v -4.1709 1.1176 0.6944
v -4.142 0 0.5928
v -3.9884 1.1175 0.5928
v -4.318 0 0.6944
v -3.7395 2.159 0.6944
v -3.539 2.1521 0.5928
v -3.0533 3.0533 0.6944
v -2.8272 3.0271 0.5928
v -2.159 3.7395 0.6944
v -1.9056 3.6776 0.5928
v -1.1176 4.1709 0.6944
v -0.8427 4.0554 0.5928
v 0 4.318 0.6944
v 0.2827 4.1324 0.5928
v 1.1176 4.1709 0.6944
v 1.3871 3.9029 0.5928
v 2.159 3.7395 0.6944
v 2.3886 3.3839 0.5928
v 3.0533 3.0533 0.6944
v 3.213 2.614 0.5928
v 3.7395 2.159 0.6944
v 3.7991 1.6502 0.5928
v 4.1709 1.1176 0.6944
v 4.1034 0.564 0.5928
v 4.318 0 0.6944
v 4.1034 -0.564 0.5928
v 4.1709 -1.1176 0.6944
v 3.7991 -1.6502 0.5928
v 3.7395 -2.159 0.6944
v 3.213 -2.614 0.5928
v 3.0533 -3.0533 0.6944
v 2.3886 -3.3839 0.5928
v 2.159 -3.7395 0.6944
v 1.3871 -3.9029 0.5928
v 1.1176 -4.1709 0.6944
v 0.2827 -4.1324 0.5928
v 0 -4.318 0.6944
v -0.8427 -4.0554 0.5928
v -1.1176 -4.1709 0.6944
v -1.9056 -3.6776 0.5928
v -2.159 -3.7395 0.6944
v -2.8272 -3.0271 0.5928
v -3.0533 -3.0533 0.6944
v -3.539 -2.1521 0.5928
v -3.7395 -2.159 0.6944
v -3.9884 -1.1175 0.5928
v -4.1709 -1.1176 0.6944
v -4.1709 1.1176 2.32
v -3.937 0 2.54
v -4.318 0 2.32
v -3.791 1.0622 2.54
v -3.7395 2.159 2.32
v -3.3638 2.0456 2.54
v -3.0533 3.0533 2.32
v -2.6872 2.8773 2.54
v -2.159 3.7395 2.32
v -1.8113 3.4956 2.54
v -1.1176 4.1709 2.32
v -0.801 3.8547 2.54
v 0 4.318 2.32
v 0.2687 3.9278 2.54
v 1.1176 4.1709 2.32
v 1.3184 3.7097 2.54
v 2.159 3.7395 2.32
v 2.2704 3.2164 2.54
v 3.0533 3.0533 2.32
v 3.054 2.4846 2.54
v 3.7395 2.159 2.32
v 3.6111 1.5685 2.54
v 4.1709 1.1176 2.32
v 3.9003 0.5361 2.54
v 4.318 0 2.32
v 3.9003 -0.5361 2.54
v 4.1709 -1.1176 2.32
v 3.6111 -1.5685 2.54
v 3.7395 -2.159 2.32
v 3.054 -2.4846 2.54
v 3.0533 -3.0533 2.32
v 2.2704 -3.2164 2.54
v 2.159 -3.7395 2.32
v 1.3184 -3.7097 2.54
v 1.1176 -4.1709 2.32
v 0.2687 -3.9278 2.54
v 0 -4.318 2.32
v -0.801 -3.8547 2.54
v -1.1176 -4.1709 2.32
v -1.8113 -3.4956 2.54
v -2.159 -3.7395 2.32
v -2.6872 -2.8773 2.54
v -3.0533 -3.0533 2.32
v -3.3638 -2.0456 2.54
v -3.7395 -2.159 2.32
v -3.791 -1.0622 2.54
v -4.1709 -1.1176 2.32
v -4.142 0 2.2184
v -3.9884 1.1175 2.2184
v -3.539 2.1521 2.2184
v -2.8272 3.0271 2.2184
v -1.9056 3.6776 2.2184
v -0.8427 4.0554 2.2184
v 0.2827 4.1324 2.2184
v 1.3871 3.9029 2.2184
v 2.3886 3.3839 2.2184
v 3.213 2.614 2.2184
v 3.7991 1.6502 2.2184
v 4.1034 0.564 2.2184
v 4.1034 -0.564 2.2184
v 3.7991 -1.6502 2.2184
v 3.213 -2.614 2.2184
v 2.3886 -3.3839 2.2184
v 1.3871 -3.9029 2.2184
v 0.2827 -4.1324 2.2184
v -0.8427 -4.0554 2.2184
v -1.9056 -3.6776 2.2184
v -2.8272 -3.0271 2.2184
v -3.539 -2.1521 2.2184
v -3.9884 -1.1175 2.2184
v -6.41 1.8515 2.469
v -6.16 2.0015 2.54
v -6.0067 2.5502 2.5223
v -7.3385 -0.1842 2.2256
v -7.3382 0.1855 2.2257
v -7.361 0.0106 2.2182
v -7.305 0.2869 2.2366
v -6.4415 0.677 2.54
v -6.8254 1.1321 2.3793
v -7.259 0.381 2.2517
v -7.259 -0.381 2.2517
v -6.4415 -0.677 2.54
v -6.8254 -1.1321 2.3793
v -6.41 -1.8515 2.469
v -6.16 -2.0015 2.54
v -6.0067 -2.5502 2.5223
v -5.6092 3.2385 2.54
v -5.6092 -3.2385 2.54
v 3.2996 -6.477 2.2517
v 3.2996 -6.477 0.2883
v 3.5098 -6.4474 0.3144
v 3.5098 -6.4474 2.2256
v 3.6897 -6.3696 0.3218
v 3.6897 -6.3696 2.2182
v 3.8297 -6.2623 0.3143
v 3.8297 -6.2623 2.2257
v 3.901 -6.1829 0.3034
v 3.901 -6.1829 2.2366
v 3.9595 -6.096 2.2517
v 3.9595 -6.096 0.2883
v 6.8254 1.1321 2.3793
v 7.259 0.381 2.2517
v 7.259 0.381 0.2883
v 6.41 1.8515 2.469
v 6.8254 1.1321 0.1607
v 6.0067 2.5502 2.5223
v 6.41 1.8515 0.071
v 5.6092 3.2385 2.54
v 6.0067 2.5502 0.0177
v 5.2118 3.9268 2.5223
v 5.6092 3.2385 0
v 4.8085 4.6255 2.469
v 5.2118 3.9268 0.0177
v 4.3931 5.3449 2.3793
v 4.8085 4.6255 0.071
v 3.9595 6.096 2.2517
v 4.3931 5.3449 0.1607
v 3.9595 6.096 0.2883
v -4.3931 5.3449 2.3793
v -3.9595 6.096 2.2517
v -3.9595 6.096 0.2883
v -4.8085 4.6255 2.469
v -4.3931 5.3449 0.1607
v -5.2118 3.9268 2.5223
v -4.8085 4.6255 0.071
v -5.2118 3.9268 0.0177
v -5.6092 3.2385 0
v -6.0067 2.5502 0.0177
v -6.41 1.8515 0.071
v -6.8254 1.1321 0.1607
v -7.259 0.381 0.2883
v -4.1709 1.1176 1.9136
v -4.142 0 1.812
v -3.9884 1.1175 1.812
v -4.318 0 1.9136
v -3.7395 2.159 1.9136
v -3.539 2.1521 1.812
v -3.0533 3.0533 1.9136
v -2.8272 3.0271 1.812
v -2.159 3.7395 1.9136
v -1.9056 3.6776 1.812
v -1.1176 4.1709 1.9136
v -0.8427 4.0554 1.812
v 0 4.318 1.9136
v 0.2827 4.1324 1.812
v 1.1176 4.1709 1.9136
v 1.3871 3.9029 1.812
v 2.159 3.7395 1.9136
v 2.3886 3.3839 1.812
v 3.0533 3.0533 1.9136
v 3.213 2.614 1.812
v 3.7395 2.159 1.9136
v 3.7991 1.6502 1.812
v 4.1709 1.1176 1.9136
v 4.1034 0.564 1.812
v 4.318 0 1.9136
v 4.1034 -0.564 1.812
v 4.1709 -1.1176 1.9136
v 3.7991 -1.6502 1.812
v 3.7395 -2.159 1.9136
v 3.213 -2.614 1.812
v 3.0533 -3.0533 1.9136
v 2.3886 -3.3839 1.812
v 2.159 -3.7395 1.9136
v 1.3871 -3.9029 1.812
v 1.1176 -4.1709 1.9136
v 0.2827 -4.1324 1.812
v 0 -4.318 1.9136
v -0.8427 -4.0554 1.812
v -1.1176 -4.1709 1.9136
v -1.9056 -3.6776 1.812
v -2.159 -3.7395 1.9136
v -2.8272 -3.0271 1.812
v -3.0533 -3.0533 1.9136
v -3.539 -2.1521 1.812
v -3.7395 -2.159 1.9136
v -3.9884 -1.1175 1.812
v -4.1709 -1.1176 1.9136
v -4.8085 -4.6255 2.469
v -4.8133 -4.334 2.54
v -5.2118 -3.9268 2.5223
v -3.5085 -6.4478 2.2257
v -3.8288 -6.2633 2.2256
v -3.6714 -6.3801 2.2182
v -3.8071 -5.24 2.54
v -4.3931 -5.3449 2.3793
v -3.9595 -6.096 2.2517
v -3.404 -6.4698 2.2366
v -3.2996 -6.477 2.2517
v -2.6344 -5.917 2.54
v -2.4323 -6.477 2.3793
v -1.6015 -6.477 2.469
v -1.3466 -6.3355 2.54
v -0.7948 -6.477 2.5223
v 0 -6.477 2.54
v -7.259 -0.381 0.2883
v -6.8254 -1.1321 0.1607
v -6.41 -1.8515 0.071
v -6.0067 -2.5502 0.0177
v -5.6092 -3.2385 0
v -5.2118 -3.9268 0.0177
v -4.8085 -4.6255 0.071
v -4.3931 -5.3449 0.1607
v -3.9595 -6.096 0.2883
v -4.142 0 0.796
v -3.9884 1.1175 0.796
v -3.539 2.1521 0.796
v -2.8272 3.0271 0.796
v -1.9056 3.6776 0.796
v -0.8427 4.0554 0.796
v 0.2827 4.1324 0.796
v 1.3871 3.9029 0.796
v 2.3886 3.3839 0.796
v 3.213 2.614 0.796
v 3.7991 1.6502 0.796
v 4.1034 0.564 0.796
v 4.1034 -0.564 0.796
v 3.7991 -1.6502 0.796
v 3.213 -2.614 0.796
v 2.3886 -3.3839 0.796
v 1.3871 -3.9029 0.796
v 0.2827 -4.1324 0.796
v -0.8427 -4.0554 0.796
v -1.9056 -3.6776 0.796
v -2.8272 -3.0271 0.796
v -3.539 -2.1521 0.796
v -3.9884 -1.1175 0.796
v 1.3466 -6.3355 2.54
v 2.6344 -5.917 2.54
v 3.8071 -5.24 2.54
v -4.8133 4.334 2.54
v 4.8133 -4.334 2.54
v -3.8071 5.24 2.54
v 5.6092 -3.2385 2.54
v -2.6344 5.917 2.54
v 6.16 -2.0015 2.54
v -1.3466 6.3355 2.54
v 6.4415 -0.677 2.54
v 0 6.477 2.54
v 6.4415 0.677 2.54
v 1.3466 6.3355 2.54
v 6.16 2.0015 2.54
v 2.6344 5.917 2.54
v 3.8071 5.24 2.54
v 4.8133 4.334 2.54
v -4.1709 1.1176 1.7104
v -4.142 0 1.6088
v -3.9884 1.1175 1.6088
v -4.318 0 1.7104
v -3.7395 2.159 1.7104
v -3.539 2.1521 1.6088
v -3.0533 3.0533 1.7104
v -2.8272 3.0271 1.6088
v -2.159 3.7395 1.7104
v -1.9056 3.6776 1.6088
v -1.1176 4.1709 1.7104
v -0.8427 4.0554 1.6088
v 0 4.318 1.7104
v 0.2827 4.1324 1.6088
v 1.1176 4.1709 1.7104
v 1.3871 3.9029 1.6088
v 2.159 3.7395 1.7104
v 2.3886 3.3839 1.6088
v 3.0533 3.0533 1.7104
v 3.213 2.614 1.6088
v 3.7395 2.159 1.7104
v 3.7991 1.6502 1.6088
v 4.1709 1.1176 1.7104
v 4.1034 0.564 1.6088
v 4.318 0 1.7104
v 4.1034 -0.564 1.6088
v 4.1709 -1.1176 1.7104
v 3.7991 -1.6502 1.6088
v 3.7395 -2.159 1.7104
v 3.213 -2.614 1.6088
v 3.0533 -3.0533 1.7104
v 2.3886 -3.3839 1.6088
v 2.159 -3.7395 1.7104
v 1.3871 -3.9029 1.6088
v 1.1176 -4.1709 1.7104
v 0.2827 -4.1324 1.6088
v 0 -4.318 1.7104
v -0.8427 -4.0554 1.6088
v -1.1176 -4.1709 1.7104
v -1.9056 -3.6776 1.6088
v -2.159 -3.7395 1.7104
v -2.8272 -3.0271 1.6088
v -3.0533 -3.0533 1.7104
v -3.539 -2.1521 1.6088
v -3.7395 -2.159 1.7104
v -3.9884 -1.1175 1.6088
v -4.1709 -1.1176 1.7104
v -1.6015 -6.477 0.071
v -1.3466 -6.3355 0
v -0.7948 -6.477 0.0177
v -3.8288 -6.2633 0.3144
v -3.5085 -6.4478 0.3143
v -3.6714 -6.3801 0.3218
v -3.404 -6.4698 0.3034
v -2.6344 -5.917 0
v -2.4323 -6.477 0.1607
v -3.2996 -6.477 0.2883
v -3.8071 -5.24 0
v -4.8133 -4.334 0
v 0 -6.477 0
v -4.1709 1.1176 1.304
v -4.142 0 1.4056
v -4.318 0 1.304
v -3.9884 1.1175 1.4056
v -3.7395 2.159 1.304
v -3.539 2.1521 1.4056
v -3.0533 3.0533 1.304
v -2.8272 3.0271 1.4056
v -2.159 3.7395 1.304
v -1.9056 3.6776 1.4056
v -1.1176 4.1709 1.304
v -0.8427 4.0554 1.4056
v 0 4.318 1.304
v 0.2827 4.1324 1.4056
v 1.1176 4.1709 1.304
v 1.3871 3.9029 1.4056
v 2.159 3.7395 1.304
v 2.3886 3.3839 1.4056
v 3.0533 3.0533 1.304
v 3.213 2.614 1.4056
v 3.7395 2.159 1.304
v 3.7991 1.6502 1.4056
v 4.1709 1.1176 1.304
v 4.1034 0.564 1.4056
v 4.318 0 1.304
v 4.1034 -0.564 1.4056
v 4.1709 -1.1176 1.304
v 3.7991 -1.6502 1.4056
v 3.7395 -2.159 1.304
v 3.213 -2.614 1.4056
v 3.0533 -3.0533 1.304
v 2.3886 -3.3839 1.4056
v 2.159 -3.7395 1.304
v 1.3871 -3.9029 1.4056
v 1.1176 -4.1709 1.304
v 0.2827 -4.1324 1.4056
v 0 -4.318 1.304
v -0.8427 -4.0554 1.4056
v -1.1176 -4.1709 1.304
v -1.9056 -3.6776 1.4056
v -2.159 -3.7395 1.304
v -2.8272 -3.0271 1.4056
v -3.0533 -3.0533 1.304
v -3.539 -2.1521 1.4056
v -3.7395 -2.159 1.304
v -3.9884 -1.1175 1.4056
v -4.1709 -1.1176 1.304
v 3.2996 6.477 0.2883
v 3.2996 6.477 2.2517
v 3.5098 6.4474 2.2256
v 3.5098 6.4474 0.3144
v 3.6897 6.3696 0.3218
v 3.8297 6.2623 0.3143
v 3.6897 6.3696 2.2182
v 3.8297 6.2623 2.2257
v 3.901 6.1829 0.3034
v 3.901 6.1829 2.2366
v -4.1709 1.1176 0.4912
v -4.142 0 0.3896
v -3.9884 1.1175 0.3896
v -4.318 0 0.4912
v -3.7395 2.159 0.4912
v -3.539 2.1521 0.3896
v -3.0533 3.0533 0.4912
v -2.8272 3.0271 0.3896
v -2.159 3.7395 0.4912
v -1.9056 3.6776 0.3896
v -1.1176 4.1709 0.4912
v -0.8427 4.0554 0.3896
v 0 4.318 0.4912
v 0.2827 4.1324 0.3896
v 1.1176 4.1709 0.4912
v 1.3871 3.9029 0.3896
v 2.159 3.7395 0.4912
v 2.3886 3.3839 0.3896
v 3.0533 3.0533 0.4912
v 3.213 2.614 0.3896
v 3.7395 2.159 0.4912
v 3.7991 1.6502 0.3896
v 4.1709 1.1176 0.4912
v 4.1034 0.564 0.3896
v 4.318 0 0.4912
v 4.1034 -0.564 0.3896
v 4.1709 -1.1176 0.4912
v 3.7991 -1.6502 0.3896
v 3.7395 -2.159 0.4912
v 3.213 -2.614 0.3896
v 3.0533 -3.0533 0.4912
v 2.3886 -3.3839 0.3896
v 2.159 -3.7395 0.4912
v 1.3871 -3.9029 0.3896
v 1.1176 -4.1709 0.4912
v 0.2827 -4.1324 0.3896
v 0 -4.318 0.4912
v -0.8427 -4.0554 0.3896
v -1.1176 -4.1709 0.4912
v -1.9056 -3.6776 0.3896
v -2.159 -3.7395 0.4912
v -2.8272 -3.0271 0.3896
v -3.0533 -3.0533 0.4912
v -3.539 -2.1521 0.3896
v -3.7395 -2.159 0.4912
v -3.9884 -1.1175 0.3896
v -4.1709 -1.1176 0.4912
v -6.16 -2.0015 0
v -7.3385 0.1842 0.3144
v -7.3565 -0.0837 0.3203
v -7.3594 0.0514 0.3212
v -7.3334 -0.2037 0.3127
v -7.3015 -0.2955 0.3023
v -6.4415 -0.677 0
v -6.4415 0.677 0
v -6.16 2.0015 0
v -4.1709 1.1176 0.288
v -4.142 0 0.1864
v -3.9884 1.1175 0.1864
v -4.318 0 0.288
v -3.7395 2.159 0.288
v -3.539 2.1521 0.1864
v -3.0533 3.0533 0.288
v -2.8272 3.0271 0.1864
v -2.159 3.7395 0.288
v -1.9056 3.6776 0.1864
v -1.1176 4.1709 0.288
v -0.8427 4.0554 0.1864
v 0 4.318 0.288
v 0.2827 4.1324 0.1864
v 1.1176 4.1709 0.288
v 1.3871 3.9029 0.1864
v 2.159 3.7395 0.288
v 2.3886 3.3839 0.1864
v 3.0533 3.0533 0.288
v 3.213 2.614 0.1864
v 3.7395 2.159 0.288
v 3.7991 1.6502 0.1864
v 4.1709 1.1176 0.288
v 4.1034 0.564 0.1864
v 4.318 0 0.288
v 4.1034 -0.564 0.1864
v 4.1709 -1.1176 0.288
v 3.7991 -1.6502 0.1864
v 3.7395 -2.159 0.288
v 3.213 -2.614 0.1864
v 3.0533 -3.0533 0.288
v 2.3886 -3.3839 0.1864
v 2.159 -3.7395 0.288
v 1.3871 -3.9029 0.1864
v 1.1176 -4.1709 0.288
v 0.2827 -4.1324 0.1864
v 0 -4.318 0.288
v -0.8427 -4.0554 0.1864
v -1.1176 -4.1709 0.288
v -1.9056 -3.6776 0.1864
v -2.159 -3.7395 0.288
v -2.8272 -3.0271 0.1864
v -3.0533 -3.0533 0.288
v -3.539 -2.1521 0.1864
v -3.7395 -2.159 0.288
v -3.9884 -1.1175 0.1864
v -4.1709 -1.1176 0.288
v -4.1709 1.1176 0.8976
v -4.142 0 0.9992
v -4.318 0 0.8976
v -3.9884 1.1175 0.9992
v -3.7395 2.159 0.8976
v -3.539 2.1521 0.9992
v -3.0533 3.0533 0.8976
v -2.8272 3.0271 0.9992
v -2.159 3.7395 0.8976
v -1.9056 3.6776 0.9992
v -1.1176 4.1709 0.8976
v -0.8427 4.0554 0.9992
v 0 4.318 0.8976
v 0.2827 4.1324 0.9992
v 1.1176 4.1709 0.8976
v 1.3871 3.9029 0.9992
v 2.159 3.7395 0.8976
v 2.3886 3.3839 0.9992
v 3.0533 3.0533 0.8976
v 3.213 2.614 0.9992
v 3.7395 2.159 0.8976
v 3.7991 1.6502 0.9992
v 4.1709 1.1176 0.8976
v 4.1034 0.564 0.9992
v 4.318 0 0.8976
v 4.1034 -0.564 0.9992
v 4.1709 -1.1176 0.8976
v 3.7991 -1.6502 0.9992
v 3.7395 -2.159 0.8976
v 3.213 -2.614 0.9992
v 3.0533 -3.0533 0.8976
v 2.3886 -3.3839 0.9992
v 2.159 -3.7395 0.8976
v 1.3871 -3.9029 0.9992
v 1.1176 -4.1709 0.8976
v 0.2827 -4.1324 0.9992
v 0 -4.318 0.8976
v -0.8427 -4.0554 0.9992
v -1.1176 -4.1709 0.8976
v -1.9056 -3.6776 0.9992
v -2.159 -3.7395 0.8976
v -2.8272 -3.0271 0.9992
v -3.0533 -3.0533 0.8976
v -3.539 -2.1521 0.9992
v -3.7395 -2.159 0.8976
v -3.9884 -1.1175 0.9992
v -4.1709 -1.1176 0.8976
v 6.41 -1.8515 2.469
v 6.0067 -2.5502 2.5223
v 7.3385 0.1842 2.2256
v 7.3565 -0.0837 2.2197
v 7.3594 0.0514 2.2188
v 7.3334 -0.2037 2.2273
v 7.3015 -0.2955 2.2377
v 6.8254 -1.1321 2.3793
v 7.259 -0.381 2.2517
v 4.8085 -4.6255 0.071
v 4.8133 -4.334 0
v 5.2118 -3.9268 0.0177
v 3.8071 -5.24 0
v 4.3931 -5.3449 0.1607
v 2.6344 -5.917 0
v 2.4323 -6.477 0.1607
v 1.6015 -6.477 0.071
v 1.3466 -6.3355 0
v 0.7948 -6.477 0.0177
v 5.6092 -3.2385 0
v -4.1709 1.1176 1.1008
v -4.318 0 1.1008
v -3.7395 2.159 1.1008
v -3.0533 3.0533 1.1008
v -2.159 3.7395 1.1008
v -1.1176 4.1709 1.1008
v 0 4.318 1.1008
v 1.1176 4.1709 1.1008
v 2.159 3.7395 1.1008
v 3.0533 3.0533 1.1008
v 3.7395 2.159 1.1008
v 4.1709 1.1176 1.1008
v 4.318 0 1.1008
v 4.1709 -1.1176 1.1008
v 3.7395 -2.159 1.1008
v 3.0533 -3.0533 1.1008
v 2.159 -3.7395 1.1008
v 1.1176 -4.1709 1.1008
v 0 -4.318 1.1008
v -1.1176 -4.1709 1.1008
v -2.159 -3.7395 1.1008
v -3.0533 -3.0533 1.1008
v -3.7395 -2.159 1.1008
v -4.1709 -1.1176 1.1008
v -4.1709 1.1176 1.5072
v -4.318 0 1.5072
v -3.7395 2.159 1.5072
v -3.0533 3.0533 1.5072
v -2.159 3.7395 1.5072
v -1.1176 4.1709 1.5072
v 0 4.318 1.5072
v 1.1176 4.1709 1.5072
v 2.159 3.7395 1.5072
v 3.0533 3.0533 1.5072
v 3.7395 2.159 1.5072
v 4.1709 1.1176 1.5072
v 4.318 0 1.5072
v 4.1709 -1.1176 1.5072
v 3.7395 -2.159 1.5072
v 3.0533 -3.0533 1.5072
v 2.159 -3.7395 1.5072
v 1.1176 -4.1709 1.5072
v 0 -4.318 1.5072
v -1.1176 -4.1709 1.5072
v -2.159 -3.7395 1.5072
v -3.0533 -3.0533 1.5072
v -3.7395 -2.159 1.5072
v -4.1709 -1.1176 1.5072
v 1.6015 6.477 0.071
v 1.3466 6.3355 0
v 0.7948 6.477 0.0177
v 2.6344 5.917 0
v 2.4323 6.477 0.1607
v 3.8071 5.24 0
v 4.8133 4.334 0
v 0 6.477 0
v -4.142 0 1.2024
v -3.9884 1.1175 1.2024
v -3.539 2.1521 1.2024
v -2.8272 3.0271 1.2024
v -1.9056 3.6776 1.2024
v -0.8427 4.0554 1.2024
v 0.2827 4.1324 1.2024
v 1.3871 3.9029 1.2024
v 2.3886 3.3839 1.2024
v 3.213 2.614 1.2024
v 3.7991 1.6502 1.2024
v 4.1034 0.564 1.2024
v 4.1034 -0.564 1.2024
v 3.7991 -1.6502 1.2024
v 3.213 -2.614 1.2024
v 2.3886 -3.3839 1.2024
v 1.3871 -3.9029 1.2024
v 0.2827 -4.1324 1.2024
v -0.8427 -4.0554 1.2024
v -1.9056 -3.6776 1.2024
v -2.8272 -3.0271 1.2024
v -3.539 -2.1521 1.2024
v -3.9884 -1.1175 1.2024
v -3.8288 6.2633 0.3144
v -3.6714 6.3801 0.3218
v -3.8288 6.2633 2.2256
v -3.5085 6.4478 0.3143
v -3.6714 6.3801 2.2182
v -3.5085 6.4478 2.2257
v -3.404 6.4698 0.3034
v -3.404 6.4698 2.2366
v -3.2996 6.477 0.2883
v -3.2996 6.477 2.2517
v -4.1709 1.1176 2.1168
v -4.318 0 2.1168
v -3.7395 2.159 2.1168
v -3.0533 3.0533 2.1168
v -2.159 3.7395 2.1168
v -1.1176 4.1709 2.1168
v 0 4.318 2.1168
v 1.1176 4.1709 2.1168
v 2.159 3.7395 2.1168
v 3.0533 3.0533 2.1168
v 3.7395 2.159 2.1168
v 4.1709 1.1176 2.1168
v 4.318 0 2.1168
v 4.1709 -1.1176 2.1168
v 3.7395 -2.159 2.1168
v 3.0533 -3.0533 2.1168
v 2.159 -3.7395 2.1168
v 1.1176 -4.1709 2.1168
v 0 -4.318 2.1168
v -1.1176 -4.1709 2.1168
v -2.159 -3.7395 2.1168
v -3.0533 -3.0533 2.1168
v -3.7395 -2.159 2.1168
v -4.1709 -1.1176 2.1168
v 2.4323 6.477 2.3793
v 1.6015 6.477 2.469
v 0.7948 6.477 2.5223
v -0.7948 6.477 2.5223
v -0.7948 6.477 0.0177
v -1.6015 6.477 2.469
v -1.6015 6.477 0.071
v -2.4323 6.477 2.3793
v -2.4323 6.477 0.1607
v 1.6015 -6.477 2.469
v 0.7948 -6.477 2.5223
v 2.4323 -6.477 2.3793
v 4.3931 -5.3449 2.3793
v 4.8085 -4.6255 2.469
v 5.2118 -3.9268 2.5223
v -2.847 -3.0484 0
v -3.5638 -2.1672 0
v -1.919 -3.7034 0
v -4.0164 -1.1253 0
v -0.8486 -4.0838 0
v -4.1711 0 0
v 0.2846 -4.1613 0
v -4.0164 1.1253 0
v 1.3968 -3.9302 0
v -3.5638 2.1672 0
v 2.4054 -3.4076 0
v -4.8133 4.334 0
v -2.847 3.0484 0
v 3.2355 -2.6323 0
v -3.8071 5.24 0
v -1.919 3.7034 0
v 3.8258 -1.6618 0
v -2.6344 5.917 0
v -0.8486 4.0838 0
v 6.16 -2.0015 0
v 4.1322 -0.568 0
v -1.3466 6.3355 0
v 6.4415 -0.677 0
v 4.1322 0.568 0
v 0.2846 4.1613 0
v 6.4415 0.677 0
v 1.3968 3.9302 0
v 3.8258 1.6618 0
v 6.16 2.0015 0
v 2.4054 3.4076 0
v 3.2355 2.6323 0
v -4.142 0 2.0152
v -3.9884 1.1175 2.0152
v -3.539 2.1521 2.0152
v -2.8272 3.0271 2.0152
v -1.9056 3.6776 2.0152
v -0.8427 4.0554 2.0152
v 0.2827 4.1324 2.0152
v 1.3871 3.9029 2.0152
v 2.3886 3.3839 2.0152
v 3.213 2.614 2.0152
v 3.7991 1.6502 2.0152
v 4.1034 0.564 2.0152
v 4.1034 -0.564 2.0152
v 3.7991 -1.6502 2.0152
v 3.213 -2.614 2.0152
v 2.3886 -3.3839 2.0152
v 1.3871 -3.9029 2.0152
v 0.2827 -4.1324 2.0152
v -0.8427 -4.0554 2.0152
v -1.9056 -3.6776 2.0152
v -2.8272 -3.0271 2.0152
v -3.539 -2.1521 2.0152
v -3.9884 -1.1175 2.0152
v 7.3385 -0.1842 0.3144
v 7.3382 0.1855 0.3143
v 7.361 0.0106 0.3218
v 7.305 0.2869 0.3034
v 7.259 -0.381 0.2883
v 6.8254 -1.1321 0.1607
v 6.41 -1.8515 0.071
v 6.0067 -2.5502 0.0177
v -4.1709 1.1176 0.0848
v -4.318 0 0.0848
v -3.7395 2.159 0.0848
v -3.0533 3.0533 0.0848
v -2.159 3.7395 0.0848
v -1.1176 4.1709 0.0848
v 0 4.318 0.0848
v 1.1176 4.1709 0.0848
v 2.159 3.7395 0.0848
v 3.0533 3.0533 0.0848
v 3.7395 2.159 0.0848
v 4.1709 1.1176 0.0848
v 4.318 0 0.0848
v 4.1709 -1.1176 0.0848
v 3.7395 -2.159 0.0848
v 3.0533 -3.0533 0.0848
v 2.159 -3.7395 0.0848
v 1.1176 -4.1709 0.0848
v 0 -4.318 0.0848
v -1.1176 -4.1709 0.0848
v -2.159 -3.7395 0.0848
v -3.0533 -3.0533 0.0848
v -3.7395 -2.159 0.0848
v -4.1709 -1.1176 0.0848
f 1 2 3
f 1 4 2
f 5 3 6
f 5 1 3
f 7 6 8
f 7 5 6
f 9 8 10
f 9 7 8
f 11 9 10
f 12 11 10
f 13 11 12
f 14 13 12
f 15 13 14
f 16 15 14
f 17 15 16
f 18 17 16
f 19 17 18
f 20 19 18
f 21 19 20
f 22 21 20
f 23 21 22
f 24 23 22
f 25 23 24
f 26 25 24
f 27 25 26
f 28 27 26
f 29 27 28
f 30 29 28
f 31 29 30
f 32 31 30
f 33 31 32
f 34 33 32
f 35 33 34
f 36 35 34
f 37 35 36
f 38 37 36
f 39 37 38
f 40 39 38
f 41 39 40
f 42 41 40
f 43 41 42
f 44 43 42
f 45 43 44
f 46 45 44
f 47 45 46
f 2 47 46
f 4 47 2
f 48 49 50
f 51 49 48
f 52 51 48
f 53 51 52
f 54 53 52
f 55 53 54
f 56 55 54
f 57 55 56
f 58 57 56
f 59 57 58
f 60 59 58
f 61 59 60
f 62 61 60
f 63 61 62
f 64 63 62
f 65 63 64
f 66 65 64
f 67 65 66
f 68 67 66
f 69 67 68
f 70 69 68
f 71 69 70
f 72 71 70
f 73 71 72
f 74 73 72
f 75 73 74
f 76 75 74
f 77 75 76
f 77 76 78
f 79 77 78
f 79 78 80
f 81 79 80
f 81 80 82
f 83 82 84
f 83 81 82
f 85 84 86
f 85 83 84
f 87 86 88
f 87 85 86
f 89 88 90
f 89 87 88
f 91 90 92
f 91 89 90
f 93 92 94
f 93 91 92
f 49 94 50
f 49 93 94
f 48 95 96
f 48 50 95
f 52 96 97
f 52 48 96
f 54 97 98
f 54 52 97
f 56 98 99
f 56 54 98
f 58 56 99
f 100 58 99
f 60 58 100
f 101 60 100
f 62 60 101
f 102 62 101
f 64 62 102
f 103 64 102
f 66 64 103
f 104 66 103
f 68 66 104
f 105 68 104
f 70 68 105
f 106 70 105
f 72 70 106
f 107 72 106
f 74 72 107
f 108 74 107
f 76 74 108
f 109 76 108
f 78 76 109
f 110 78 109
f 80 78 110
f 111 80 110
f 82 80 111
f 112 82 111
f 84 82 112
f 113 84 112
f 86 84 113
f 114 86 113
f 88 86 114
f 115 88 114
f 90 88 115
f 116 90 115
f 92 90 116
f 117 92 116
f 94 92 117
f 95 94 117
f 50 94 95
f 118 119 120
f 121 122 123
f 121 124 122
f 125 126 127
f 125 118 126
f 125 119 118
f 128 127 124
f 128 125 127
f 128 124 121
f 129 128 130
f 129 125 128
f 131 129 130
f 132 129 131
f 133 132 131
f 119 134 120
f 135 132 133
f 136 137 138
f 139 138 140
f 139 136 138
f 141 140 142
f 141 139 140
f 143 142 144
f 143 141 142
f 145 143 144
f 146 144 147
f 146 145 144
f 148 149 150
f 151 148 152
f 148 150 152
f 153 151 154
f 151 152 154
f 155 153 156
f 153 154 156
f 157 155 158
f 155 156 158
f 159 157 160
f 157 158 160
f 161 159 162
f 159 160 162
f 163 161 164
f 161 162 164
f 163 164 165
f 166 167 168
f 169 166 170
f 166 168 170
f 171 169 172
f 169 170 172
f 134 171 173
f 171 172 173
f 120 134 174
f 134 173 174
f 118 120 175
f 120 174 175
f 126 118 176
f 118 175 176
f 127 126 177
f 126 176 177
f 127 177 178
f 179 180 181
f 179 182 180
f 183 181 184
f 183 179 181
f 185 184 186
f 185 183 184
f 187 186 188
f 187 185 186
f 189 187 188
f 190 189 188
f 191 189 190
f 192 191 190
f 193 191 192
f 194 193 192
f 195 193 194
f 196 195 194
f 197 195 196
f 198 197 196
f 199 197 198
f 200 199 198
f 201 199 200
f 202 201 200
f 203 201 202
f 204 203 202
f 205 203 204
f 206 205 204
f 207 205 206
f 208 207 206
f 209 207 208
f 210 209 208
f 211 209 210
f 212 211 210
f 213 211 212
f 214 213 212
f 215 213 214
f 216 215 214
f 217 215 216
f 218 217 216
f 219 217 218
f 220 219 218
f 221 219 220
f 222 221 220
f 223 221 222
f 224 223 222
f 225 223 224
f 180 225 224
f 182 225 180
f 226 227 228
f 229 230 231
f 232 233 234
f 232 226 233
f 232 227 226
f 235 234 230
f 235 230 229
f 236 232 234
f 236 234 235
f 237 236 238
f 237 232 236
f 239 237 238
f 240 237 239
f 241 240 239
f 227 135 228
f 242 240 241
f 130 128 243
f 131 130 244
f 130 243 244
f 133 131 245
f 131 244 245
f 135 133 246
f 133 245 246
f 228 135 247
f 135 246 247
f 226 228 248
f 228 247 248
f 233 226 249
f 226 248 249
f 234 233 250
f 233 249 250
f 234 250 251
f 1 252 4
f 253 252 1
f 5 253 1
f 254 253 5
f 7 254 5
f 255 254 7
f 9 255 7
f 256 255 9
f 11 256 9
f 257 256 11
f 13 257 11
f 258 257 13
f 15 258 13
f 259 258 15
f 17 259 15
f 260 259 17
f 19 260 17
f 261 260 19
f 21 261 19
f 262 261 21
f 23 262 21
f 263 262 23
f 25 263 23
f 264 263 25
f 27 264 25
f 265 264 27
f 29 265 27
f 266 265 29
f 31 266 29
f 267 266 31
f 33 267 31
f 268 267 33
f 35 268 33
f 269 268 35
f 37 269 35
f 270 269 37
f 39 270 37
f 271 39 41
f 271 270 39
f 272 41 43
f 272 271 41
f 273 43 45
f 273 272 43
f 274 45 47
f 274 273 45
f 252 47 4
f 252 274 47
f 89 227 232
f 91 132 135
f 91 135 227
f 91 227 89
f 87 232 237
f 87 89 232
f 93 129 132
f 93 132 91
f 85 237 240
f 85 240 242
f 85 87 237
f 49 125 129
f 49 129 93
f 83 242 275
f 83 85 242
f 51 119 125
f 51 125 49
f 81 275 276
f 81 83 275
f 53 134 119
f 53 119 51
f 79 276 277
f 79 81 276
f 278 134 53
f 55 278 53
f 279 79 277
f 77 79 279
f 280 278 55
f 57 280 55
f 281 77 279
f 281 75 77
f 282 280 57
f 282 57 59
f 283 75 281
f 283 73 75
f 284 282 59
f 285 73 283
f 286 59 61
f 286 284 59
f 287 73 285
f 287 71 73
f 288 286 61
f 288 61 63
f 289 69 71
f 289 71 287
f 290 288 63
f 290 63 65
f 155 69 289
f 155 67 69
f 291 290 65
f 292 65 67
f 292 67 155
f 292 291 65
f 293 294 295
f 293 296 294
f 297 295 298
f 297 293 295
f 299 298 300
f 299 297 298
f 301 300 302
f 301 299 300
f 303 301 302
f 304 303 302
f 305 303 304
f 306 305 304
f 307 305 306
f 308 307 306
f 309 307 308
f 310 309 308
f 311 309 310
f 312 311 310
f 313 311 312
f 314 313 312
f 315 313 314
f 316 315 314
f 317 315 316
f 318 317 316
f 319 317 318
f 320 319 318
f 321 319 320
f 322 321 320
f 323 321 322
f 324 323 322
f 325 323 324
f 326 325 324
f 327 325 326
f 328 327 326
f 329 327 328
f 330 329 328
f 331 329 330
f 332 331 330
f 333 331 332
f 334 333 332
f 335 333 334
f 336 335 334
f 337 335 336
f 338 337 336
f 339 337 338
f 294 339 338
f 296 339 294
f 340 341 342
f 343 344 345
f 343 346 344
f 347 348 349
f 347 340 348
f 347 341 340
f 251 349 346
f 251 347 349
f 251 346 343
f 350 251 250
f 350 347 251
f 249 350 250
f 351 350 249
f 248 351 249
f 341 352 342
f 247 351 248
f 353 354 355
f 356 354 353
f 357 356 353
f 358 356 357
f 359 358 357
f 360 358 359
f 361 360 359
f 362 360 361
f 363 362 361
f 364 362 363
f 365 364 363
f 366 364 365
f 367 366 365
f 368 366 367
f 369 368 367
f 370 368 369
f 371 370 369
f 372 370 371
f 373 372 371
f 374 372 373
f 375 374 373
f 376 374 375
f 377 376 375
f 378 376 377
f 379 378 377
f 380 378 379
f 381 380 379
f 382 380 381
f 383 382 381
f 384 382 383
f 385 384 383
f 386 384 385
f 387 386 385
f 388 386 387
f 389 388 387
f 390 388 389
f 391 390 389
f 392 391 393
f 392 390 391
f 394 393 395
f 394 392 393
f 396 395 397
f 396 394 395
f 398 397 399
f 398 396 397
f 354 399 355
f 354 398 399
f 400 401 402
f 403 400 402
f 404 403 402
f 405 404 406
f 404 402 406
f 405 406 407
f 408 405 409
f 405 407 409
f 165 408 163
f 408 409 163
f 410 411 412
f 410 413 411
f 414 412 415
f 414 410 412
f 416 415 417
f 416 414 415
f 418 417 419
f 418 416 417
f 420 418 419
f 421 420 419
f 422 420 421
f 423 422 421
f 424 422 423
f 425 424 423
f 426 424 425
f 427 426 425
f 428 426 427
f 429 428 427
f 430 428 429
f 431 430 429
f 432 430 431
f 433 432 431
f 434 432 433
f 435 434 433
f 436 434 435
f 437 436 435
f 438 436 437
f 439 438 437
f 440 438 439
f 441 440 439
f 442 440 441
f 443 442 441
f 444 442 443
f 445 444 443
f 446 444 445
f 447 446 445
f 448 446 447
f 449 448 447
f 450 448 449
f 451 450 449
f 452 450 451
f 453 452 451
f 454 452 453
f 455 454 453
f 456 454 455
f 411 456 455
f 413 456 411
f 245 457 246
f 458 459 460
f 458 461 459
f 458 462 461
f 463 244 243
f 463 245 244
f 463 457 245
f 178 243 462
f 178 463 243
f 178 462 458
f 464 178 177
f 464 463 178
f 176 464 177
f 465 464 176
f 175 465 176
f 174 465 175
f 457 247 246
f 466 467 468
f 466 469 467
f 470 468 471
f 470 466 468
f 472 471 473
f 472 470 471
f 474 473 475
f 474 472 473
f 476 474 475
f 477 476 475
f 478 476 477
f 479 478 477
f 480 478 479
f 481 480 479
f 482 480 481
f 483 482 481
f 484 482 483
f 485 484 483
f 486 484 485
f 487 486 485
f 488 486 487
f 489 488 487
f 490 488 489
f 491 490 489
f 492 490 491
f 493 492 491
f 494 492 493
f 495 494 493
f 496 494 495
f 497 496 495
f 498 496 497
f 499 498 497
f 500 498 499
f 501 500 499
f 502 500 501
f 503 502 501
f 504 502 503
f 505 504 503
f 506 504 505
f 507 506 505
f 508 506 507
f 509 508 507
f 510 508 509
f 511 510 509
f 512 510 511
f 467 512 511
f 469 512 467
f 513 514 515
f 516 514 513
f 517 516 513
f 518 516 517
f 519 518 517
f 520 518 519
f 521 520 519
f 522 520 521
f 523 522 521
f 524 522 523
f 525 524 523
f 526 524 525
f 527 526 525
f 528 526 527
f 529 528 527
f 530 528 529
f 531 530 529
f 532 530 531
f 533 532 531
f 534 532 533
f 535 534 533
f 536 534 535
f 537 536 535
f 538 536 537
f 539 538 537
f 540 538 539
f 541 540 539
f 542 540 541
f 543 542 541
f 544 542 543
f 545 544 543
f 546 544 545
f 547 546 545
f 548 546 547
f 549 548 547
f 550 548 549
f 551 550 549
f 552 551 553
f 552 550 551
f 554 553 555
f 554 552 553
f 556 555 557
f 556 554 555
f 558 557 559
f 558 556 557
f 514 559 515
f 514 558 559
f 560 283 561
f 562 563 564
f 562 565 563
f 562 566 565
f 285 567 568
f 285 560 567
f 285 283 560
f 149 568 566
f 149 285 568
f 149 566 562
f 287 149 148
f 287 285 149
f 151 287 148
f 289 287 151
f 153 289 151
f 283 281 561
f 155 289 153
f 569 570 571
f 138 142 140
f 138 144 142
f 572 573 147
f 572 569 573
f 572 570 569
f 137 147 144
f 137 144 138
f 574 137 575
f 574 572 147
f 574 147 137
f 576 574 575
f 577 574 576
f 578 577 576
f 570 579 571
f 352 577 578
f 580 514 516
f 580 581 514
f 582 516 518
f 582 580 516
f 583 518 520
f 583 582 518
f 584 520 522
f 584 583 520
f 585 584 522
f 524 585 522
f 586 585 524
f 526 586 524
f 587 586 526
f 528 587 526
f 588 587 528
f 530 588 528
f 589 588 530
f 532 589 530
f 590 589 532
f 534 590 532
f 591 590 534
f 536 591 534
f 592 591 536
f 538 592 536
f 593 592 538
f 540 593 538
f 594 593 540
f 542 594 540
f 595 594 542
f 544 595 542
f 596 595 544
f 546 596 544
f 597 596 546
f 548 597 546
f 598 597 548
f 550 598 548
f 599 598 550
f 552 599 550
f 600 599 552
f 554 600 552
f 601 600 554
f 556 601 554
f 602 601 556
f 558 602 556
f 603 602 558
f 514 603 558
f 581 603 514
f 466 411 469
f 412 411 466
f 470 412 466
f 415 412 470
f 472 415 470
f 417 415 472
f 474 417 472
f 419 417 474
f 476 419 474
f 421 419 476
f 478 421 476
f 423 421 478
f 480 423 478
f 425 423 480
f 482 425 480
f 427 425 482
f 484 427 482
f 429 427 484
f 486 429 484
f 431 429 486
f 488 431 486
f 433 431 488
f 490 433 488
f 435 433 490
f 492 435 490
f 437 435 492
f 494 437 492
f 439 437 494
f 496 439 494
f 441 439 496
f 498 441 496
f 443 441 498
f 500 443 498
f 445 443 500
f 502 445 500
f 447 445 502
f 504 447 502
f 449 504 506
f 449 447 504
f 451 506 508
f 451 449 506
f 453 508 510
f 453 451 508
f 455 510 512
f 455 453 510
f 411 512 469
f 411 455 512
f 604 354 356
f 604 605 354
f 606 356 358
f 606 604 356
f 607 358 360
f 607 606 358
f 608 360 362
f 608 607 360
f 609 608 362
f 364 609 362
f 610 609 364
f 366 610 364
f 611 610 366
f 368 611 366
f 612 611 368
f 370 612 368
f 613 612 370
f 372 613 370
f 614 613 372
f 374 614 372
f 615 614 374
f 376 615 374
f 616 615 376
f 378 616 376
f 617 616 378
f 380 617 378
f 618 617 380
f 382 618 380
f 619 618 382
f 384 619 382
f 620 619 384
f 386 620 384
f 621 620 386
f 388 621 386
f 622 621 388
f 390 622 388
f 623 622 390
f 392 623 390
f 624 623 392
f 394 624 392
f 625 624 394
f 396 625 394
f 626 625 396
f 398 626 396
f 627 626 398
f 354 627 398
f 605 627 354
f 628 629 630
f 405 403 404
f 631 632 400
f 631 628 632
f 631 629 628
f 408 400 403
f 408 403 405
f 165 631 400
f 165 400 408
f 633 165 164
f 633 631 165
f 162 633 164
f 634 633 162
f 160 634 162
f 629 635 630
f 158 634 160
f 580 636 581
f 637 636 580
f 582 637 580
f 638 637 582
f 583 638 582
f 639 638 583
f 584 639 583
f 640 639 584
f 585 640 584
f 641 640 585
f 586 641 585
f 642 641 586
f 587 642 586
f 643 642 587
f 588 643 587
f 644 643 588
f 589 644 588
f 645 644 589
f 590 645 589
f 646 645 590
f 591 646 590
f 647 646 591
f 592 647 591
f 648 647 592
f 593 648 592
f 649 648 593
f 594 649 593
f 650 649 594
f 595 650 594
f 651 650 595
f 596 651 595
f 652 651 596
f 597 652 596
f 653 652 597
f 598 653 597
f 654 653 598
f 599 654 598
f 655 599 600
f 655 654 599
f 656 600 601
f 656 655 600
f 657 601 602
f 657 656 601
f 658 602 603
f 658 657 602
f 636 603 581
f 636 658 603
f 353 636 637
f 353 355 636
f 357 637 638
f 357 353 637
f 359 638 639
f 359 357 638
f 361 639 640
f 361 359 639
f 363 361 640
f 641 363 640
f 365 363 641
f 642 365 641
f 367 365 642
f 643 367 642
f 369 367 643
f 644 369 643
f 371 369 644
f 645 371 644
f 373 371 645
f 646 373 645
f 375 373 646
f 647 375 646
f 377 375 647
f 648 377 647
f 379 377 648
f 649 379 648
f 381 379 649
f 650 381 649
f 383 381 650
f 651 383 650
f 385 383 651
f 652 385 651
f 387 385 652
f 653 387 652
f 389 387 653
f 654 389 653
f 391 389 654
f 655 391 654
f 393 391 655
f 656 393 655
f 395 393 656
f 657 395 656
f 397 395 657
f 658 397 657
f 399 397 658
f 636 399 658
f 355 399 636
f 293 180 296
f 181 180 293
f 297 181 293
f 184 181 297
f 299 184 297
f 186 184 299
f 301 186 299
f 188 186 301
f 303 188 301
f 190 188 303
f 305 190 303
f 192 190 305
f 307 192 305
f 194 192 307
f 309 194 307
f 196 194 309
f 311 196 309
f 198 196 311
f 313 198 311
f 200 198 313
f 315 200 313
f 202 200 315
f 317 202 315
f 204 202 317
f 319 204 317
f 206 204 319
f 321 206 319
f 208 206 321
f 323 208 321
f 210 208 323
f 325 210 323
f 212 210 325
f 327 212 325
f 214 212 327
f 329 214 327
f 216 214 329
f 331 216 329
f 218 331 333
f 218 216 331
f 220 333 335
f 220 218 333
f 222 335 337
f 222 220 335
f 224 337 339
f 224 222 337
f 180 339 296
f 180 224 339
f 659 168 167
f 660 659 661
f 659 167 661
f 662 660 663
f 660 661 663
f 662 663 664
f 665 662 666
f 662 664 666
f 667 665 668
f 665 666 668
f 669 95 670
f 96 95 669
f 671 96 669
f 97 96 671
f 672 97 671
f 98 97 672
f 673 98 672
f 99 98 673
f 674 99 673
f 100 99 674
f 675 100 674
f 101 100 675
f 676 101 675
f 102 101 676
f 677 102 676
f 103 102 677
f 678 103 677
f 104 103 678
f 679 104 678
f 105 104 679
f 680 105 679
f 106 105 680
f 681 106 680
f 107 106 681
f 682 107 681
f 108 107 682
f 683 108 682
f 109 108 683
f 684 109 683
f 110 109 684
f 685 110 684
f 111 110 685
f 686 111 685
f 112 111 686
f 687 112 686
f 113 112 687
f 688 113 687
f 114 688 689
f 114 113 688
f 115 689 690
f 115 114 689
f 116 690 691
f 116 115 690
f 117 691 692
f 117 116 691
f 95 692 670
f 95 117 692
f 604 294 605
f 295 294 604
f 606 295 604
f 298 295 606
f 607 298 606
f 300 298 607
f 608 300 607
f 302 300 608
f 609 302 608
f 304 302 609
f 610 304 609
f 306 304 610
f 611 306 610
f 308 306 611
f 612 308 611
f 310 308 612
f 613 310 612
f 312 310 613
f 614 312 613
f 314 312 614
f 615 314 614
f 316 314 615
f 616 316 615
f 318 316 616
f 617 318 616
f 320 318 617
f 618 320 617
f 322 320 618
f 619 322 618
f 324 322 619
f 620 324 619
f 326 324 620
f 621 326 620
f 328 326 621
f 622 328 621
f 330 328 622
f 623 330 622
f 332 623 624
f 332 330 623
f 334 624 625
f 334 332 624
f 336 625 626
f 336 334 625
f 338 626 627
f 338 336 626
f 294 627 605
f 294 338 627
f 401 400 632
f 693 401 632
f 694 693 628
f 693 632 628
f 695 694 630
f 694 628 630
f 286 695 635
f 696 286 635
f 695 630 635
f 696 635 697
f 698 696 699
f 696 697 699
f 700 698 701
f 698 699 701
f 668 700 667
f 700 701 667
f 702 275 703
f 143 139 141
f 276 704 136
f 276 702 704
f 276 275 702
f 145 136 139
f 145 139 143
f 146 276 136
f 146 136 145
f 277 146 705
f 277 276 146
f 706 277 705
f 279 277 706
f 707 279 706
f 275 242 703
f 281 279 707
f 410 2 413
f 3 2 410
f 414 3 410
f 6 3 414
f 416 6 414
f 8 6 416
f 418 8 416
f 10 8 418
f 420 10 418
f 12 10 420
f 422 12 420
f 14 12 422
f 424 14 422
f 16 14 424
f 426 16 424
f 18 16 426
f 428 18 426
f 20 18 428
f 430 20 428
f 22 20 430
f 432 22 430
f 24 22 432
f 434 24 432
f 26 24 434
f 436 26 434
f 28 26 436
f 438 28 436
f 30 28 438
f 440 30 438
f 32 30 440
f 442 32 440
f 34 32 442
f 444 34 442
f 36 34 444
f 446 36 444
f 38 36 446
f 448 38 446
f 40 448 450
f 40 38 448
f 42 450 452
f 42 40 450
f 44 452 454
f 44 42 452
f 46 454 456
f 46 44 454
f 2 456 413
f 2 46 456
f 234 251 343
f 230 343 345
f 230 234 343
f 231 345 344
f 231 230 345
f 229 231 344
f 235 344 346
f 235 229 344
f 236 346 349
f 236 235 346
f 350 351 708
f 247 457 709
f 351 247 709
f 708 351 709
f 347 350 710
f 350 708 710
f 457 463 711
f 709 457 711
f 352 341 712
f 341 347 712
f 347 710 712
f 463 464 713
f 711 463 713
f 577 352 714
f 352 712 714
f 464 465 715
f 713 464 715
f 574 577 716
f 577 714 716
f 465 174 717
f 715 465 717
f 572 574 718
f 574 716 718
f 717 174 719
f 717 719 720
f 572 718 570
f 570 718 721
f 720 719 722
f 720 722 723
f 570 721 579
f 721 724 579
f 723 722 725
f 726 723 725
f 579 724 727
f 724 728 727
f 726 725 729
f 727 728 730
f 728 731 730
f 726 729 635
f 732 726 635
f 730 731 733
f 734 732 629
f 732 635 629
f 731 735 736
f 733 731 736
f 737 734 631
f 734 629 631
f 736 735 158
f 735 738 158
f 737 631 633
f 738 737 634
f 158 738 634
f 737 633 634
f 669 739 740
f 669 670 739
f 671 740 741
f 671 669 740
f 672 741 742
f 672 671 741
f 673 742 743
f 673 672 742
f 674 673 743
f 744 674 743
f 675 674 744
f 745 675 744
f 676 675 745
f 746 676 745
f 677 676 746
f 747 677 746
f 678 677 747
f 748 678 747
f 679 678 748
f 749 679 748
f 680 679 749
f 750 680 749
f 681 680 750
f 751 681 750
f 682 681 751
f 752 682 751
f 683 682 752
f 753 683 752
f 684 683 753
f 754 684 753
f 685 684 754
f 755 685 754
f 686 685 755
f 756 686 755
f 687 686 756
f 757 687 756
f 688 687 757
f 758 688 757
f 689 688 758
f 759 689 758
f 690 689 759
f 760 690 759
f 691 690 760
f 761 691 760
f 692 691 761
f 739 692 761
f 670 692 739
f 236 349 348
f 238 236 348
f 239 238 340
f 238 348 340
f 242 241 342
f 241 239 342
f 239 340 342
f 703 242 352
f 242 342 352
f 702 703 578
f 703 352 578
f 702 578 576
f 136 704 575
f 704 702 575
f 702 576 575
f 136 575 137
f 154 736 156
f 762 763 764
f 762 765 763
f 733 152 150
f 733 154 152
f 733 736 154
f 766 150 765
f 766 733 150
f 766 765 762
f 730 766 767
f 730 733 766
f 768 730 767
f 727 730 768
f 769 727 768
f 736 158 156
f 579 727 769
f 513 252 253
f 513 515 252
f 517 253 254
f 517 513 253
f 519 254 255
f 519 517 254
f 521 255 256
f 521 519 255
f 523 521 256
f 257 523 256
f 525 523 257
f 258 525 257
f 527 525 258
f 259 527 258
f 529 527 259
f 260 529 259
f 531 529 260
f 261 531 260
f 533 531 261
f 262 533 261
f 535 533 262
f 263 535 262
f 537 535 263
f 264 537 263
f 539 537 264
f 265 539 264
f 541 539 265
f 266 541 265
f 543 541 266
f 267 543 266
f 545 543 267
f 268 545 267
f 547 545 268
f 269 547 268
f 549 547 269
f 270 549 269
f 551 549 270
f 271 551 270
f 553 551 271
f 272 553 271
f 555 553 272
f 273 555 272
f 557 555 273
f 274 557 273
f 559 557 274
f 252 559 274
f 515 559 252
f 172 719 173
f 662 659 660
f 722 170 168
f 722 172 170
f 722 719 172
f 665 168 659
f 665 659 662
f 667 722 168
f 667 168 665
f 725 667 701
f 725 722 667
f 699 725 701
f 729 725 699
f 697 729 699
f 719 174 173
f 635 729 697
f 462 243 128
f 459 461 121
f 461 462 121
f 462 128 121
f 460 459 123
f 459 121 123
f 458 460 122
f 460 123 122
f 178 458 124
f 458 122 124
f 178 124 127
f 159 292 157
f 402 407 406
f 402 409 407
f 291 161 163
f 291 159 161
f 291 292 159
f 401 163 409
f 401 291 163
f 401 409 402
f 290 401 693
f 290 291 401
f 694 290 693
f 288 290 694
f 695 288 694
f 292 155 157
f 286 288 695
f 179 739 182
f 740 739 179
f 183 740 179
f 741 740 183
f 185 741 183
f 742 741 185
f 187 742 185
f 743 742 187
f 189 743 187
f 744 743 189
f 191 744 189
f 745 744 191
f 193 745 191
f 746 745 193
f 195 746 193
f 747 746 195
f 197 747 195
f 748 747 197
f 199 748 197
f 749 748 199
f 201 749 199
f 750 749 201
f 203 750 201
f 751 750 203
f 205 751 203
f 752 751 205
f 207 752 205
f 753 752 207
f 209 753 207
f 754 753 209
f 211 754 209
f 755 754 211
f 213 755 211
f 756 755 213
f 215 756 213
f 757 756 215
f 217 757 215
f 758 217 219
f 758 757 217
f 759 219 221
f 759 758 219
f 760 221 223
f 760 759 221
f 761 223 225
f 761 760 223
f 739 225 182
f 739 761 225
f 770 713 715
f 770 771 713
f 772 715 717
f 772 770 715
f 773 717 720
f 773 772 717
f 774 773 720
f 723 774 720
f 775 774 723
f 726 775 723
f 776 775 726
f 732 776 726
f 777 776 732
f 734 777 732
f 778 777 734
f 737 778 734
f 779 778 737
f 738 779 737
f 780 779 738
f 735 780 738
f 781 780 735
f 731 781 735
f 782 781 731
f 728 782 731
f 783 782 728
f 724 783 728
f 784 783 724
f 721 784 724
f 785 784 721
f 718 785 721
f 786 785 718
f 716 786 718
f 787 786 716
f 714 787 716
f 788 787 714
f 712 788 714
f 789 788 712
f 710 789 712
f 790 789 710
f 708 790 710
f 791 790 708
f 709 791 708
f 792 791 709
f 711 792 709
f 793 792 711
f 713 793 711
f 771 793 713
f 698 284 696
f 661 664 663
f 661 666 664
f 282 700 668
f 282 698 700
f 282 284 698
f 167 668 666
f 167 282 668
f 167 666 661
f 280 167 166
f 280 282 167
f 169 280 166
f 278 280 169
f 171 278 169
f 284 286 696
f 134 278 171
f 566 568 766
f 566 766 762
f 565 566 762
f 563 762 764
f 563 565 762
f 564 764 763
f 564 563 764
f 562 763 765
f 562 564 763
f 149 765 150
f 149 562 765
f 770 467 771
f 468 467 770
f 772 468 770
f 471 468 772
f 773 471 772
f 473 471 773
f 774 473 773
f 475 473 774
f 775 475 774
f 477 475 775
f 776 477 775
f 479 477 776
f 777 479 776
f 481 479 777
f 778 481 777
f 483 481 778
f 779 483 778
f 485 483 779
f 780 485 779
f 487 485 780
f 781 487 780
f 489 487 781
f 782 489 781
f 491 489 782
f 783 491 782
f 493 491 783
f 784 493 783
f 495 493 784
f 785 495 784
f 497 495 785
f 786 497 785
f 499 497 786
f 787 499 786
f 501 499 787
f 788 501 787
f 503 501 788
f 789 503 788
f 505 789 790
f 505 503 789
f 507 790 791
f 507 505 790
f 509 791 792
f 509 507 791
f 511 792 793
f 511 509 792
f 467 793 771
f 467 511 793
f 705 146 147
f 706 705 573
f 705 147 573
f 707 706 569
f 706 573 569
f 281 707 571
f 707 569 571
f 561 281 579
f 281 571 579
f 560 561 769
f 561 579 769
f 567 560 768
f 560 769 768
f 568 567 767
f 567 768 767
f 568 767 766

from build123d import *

# Parameters (mm, degrees)
SKETCH1_R          = 3.937
EXTRUDE1_DEPTH     = 2.54
FILLET1_R          = 0.762
SKETCH2_OUTSIDE_W  = 40.128
SKETCH2_OUTSIDE_H  = 38.36
SKETCH2_OUTSIDE_R  = 6.477
CUT_EXTRUDE1_DEPTH = 3.54
CUT_EXTRUDE1_DRAFT = -70
SKETCH3_OUTSIDE_W  = 40.128
SKETCH3_OUTSIDE_H  = 38.36
SKETCH3_OUTSIDE_R  = 6.477
CUT_EXTRUDE2_DEPTH = 3.5400001
CUT_EXTRUDE2_DRAFT = -70
LPATTERN1_COUNT    = 13
LPATTERN1_PITCH    = 0.2032


with BuildPart() as part:
    # Sketch1 → Extrude1 (new body)
    with BuildSketch(Plane.XY):
        Polygon((-7.478995387, 0), (-3.739497694, -6.477), (3.739497694, -6.477), (7.478995387, 0), (3.739497694, 6.477), (-3.739497694, 6.477), align=None)
        Circle(SKETCH1_R, mode=Mode.SUBTRACT)
    extrude(amount=EXTRUDE1_DEPTH)

    # Fillet1
    fillet1_edges = [part.edges().sort_by_distance(p)[0] for p in [
        (7.478995387, 0, 1.27),
        (3.739497694, -6.477, 1.27),
        (-3.739497694, -6.477, 1.27),
        (-7.478995387, 0, 1.27),
        (-3.739497694, 6.477, 1.27),
        (3.739497694, 6.477, 1.27),
    ]]
    fillet(fillet1_edges, radius=FILLET1_R)


with BuildPart() as cut_extrude1_tool:
    # Sketch2 outside → Cut-Extrude1 (with draft: the straight prism first)
    with BuildSketch(Plane.XY.offset(2.54)):
        Rectangle(SKETCH2_OUTSIDE_W, SKETCH2_OUTSIDE_H)
        Circle(SKETCH2_OUTSIDE_R, mode=Mode.SUBTRACT)
    extrude(amount=-CUT_EXTRUDE1_DEPTH)
    # Cut-Extrude1: the draft: its side faces are tilted about the plane it starts from
    cut_extrude1_sides = [cut_extrude1_tool.faces().sort_by_distance(p)[0] for p in [
        (0, -19.18, 0.77),
        (20.064, 0, 0.77),
        (0, 19.18, 0.77),
        (-20.064, 0, 0.77),
        (-6.477, 0, 0.77),
    ]]
    draft(cut_extrude1_sides, Plane.XY.offset(2.54), CUT_EXTRUDE1_DRAFT)


with BuildPart() as part_1:
    add(part.part)

    # Cut-Extrude1: cut by cut_extrude1_tool
    add(cut_extrude1_tool.part, mode=Mode.SUBTRACT)


with BuildPart() as cut_extrude2_tool:
    # Sketch3 outside → Cut-Extrude2 (with draft: the straight prism first)
    with BuildSketch(Plane(origin=(0, 0, 0), x_dir=(-1, 0, 0), z_dir=(0, 0, -1))):
        Rectangle(SKETCH3_OUTSIDE_W, SKETCH3_OUTSIDE_H)
        Circle(SKETCH3_OUTSIDE_R, mode=Mode.SUBTRACT)
    extrude(amount=-CUT_EXTRUDE2_DEPTH)
    # Cut-Extrude2: the draft: its side faces are tilted about the plane it starts from
    cut_extrude2_sides = [cut_extrude2_tool.faces().sort_by_distance(p)[0] for p in [
        (0, -19.18, 1.77000005),
        (-20.064, 0, 1.77000005),
        (0, 19.18, 1.77000005),
        (20.064, 0, 1.77000005),
        (6.477, 0, 1.77000005),
    ]]
    draft(cut_extrude2_sides, Plane(origin=(0, 0, 0), x_dir=(-1, 0, 0), z_dir=(0, 0, -1)), CUT_EXTRUDE2_DRAFT)


with BuildPart() as part_2:
    add(part_1.part)

    # Cut-Extrude2: cut by cut_extrude2_tool
    add(cut_extrude2_tool.part, mode=Mode.SUBTRACT)

    # Sketch4 → Cut-Revolve1 (revolve, cut)
    with BuildSketch(Plane(origin=(0, 0, 0), x_dir=(1, 0, 0), z_dir=(0, 1, 0))):
        Polygon((-3.937, -2.54), (-3.937, -2.100059095), (-4.318, -2.320029547), align=None)
    cut_revolve1 = revolve(axis=Axis((0, 0, 2.54), (0, 0, -1)), mode=Mode.SUBTRACT)

    # LPattern1: Cut-Revolve1 ×13
    with Locations(*[(0, 0, -i * LPATTERN1_PITCH) for i in range(1, LPATTERN1_COUNT)]):
        add(cut_revolve1, mode=Mode.SUBTRACT)


solid = part_2.part
